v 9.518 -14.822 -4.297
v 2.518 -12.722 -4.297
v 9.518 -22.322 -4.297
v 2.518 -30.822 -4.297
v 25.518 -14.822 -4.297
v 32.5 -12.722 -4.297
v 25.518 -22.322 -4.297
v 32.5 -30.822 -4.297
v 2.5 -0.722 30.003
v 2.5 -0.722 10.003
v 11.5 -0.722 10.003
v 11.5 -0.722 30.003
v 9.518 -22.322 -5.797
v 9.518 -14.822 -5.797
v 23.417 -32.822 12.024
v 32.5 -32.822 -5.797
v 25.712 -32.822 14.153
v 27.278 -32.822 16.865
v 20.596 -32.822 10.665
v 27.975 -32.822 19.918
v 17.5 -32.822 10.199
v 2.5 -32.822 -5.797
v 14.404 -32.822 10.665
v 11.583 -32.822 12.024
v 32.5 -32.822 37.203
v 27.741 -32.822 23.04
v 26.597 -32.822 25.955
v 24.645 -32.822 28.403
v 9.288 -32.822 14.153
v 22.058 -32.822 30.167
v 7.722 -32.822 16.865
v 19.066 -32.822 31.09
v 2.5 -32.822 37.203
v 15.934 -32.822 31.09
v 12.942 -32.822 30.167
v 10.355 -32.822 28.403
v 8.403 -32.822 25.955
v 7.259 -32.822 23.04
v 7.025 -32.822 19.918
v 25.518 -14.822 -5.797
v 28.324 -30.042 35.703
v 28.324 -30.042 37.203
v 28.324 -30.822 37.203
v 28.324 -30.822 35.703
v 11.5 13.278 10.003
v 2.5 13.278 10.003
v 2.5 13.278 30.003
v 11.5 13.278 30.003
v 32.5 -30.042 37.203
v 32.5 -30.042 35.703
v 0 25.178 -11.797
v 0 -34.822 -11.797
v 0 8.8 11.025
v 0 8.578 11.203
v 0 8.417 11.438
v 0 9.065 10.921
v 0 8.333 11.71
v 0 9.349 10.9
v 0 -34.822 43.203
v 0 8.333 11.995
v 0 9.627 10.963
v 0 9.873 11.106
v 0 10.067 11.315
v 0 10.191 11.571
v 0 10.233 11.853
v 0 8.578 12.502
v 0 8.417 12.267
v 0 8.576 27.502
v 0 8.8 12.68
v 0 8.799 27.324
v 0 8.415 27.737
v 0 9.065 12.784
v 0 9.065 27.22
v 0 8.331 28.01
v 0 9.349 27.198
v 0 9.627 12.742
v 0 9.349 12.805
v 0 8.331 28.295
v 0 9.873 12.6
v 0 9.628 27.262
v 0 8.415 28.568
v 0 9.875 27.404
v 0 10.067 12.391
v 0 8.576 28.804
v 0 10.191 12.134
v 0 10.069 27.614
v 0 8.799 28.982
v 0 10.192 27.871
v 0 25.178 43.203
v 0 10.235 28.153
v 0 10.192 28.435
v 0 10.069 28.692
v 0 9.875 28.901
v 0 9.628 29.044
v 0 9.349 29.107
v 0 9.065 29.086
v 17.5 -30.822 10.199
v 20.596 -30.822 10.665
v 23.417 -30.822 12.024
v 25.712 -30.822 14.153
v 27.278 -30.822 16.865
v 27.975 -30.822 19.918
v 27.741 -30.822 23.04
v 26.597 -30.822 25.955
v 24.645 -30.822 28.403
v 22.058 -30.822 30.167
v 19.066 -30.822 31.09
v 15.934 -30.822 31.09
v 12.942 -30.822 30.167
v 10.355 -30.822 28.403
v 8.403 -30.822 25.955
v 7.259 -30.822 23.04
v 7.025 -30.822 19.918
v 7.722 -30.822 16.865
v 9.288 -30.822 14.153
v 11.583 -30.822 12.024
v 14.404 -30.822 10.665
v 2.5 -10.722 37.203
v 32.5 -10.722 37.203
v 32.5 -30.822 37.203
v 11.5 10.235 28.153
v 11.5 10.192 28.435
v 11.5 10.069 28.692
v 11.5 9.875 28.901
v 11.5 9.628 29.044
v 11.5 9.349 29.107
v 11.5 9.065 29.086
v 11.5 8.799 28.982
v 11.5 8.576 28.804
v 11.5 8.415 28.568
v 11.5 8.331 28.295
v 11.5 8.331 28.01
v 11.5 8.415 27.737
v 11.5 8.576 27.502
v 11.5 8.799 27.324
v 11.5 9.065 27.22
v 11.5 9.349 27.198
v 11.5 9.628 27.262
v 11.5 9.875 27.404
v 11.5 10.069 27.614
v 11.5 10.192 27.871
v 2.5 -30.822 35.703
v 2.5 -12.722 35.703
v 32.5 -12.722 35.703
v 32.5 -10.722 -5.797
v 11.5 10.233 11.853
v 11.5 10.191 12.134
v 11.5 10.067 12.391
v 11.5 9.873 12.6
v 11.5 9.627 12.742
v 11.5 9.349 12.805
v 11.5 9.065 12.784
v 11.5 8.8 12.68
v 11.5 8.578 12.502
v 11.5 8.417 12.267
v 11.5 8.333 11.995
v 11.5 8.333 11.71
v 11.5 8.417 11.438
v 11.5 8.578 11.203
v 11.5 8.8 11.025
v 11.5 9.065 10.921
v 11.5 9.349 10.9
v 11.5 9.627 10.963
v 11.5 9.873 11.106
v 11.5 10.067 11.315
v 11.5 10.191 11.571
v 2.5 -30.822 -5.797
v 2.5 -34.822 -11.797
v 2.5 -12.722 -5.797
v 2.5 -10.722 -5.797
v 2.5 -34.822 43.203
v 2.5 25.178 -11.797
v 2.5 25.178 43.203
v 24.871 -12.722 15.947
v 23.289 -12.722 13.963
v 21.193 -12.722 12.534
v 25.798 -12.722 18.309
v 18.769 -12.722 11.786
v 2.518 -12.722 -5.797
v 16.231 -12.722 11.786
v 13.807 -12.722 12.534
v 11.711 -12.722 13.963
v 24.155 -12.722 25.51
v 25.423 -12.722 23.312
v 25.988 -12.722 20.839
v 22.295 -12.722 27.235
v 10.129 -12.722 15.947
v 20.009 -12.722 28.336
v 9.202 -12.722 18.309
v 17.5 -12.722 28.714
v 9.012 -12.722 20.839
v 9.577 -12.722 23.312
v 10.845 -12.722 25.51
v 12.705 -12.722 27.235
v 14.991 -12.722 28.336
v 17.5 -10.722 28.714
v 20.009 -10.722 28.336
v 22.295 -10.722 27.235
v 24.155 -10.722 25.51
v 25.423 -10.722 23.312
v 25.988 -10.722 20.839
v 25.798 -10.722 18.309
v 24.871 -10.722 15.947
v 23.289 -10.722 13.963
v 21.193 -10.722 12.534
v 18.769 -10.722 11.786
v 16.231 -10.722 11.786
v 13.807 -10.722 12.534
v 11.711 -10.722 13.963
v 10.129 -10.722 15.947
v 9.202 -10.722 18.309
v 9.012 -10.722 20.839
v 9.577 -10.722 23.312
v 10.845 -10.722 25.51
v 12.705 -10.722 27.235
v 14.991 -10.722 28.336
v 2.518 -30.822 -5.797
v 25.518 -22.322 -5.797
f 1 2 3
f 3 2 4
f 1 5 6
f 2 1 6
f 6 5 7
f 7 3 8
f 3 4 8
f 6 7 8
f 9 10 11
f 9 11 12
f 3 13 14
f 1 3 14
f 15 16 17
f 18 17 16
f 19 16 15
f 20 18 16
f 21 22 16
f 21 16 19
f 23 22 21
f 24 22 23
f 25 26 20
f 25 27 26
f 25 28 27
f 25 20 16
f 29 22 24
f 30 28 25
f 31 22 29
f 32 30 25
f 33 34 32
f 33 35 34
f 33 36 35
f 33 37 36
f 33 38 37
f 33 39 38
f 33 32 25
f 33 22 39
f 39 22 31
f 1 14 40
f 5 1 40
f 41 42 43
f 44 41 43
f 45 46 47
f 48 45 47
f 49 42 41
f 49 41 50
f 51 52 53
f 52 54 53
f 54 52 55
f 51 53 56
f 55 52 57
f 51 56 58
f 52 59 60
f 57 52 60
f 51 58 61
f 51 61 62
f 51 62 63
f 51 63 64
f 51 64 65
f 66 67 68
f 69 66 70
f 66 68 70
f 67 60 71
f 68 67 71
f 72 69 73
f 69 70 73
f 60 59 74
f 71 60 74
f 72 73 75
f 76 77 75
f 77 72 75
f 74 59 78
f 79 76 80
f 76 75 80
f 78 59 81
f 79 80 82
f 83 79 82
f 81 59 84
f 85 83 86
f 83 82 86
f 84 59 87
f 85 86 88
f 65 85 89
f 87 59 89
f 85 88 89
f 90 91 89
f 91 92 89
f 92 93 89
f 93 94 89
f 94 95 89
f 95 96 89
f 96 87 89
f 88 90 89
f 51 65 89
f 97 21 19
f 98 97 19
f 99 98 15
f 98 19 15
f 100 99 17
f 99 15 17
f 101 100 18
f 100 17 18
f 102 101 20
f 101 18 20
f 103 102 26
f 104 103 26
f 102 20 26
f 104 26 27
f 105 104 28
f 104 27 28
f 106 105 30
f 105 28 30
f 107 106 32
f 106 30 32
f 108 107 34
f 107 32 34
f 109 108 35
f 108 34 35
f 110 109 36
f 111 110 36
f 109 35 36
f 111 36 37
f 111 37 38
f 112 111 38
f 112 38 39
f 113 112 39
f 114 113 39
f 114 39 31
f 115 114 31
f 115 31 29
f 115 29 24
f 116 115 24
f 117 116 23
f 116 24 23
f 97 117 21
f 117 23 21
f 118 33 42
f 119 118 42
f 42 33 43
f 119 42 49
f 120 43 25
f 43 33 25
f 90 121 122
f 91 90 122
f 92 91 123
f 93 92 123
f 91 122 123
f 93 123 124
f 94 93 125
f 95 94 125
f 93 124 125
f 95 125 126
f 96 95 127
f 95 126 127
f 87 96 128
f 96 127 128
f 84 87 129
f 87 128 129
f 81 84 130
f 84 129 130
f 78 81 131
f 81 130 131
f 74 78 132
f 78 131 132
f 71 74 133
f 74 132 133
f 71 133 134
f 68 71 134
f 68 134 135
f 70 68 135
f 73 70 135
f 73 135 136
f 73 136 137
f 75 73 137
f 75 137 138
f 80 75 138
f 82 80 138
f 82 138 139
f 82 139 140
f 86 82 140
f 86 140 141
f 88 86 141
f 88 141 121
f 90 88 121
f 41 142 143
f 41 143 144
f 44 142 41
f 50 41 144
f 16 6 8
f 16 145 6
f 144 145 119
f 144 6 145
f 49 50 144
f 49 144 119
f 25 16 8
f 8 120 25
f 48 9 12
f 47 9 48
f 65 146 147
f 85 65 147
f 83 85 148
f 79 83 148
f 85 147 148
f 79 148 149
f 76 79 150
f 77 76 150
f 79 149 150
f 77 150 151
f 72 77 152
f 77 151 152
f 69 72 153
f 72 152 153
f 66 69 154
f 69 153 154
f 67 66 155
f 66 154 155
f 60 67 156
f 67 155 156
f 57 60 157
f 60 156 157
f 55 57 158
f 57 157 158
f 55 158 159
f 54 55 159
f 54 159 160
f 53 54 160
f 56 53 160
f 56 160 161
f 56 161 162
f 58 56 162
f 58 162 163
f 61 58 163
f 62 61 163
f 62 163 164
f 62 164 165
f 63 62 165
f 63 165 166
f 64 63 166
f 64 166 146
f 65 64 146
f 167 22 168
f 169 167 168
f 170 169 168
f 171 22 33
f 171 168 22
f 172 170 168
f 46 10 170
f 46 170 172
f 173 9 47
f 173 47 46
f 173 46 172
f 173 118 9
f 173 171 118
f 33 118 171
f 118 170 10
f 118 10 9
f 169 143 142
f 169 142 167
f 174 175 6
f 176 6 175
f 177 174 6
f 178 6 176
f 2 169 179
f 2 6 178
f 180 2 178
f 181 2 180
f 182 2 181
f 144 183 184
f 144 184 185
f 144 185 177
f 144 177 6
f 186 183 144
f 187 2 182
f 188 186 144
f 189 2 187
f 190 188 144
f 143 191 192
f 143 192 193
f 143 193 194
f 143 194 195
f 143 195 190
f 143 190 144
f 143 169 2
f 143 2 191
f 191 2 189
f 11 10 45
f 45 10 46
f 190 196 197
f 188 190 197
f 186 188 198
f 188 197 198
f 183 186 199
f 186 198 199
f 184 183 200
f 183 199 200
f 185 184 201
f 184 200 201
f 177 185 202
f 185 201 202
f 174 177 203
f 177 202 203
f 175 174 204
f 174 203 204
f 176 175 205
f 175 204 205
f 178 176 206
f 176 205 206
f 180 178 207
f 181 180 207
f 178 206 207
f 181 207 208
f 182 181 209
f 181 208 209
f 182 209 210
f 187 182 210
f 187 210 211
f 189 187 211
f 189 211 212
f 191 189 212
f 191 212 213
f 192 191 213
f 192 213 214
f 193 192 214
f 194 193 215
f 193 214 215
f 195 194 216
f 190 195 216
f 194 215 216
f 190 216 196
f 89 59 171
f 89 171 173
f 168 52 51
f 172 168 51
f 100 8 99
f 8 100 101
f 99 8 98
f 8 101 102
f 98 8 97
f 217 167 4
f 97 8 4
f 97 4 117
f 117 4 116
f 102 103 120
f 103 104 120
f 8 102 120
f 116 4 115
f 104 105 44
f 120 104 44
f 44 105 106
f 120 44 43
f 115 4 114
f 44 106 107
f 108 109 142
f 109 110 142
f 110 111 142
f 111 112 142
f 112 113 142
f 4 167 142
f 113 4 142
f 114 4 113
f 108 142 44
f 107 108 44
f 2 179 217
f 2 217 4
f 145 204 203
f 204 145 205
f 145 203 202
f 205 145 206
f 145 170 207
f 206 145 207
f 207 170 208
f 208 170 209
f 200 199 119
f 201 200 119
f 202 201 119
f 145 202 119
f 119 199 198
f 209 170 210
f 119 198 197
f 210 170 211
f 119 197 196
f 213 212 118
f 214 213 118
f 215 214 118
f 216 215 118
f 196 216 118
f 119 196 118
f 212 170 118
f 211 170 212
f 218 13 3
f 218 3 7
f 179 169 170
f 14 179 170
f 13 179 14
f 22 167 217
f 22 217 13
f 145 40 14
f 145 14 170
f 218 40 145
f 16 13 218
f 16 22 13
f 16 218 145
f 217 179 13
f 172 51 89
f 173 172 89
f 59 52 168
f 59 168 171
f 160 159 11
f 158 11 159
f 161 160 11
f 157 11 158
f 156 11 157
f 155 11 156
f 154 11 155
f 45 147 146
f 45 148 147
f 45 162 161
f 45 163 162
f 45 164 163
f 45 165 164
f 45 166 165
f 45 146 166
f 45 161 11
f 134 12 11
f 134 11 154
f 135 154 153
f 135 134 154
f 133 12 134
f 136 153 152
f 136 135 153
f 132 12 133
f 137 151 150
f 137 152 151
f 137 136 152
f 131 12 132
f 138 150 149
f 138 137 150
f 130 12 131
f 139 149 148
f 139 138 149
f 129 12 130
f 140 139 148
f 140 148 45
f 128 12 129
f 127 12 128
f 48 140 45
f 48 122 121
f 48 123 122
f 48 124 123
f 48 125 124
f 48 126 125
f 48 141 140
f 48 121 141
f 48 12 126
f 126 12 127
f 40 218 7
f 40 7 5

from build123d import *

# Parameters (mm, degrees)
SKETCH_W        = 60
SKETCH_H        = 55
PAD_DEPTH       = 2.5
SKETCH001_W     = 2
SKETCH001_H     = 43
PAD001_DEPTH    = 30
SKETCH003_W     = 2
SKETCH003_H     = 43
PAD002_DEPTH    = 30
SKETCH004_W     = 1.5
SKETCH004_H     = 29.981854
PAD003_DEPTH    = 18.2
SKETCH005_W     = 1.5
SKETCH005_H     = 30
PAD004_DEPTH    = 18.2
SKETCH006_R     = 10.504142
POCKET_DEPTH    = 2
SKETCH007_W     = 0.78
SKETCH007_H     = 4.175734
POCKET001_DEPTH = 2
SKETCH009_R     = 8.511691
POCKET002_DEPTH = 2
SKETCH010_W     = 7.5
SKETCH010_H     = 16
POCKET003_DEPTH = 2
SKETCH011_W     = 14
SKETCH011_H     = 20
PAD005_DEPTH    = 9
SKETCH012_R     = 0.957136
SKETCH012_R_2   = 0.955296
POCKET004_DEPTH = 12


with BuildPart() as part:
    # Sketch → Pad (new body)
    with BuildSketch(Plane.YZ):
        with Locations((-4.822152, 15.702681)):
            Rectangle(SKETCH_W, SKETCH_H)
    extrude(amount=PAD_DEPTH)

    # Sketch001 (on Face6 of Pad) → Pad001 (join)
    with BuildSketch(Plane.YZ.offset(2.5)):
        with Locations((-31.822152, 15.702681)):
            Rectangle(SKETCH001_W, SKETCH001_H)
    extrude(amount=PAD001_DEPTH)

    # Sketch003 (on Face5 of Pad001) → Pad002 (join)
    with BuildSketch(Plane.YZ.offset(2.5)):
        with Locations((-11.722152, 15.702681)):
            Rectangle(SKETCH003_W, SKETCH003_H)
    extrude(amount=PAD002_DEPTH)

    # Sketch004 (on Face9 of Pad002) → Pad003 (join)
    with BuildSketch(Plane.ZX.offset(-30.822152)):
        with Locations((-5.047319, 17.509073)):
            Rectangle(SKETCH004_W, SKETCH004_H)
    extrude(amount=PAD003_DEPTH)

    # Sketch005 (on Face9 of Pad003) → Pad004 (join)
    with BuildSketch(Plane.ZX.offset(-30.822152)):
        with Locations((36.452681, 17.5)):
            Rectangle(SKETCH005_W, SKETCH005_H)
    extrude(amount=PAD004_DEPTH)

    # Sketch006 (on Face17 of Pad004) → Pocket (cut)
    with BuildSketch(Plane(origin=(0, -32.822152, 0), x_dir=(0, 0, -1), z_dir=(0, -1, 0))):
        with Locations((-20.702681, 17.5)):
            Circle(SKETCH006_R)
    extrude(amount=-POCKET_DEPTH, mode=Mode.SUBTRACT)

    # Sketch007 (on Face8 of Pocket) → Pocket001 (cut)
    with BuildSketch(Plane(origin=(0, 0, 37.202681), x_dir=(0, -1, 0), z_dir=(0, 0, 1))):
        with Locations((30.432152, 30.412133)):
            Rectangle(SKETCH007_W, SKETCH007_H)
    extrude(amount=-POCKET001_DEPTH, mode=Mode.SUBTRACT)

    # Sketch009 (on Face11 of Pocket) → Pocket002 (cut)
    with BuildSketch(Plane.ZX.offset(-10.722152)):
        with Locations((20.202681, 17.5)):
            Circle(SKETCH009_R)
    extrude(amount=-POCKET002_DEPTH, mode=Mode.SUBTRACT)

    # Sketch010 (on Face31 of Pocket002) → Pocket003 (cut)
    with BuildSketch(Plane.YX.offset(5.797319)):
        with Locations((-18.572152, 17.518146)):
            Rectangle(SKETCH010_W, SKETCH010_H)
    extrude(amount=-POCKET003_DEPTH, mode=Mode.SUBTRACT)

    # Sketch011 (on Face5 of Pocket003) → Pad005 (join)
    with BuildSketch(Plane.YZ.offset(2.5)):
        with Locations((6.277848, 20.002681)):
            Rectangle(SKETCH011_W, SKETCH011_H)
    extrude(amount=PAD005_DEPTH)

    # Sketch012 (on Face36 of Pad005) → Pocket004 (cut)
    with BuildSketch(Plane.YZ.offset(11.5)):
        with Locations((9.277848, 28.152681)):
            Circle(SKETCH012_R)
        with Locations((9.277848, 11.852681)):
            Circle(SKETCH012_R_2)
    extrude(amount=-POCKET004_DEPTH, mode=Mode.SUBTRACT)


solid = part.part
